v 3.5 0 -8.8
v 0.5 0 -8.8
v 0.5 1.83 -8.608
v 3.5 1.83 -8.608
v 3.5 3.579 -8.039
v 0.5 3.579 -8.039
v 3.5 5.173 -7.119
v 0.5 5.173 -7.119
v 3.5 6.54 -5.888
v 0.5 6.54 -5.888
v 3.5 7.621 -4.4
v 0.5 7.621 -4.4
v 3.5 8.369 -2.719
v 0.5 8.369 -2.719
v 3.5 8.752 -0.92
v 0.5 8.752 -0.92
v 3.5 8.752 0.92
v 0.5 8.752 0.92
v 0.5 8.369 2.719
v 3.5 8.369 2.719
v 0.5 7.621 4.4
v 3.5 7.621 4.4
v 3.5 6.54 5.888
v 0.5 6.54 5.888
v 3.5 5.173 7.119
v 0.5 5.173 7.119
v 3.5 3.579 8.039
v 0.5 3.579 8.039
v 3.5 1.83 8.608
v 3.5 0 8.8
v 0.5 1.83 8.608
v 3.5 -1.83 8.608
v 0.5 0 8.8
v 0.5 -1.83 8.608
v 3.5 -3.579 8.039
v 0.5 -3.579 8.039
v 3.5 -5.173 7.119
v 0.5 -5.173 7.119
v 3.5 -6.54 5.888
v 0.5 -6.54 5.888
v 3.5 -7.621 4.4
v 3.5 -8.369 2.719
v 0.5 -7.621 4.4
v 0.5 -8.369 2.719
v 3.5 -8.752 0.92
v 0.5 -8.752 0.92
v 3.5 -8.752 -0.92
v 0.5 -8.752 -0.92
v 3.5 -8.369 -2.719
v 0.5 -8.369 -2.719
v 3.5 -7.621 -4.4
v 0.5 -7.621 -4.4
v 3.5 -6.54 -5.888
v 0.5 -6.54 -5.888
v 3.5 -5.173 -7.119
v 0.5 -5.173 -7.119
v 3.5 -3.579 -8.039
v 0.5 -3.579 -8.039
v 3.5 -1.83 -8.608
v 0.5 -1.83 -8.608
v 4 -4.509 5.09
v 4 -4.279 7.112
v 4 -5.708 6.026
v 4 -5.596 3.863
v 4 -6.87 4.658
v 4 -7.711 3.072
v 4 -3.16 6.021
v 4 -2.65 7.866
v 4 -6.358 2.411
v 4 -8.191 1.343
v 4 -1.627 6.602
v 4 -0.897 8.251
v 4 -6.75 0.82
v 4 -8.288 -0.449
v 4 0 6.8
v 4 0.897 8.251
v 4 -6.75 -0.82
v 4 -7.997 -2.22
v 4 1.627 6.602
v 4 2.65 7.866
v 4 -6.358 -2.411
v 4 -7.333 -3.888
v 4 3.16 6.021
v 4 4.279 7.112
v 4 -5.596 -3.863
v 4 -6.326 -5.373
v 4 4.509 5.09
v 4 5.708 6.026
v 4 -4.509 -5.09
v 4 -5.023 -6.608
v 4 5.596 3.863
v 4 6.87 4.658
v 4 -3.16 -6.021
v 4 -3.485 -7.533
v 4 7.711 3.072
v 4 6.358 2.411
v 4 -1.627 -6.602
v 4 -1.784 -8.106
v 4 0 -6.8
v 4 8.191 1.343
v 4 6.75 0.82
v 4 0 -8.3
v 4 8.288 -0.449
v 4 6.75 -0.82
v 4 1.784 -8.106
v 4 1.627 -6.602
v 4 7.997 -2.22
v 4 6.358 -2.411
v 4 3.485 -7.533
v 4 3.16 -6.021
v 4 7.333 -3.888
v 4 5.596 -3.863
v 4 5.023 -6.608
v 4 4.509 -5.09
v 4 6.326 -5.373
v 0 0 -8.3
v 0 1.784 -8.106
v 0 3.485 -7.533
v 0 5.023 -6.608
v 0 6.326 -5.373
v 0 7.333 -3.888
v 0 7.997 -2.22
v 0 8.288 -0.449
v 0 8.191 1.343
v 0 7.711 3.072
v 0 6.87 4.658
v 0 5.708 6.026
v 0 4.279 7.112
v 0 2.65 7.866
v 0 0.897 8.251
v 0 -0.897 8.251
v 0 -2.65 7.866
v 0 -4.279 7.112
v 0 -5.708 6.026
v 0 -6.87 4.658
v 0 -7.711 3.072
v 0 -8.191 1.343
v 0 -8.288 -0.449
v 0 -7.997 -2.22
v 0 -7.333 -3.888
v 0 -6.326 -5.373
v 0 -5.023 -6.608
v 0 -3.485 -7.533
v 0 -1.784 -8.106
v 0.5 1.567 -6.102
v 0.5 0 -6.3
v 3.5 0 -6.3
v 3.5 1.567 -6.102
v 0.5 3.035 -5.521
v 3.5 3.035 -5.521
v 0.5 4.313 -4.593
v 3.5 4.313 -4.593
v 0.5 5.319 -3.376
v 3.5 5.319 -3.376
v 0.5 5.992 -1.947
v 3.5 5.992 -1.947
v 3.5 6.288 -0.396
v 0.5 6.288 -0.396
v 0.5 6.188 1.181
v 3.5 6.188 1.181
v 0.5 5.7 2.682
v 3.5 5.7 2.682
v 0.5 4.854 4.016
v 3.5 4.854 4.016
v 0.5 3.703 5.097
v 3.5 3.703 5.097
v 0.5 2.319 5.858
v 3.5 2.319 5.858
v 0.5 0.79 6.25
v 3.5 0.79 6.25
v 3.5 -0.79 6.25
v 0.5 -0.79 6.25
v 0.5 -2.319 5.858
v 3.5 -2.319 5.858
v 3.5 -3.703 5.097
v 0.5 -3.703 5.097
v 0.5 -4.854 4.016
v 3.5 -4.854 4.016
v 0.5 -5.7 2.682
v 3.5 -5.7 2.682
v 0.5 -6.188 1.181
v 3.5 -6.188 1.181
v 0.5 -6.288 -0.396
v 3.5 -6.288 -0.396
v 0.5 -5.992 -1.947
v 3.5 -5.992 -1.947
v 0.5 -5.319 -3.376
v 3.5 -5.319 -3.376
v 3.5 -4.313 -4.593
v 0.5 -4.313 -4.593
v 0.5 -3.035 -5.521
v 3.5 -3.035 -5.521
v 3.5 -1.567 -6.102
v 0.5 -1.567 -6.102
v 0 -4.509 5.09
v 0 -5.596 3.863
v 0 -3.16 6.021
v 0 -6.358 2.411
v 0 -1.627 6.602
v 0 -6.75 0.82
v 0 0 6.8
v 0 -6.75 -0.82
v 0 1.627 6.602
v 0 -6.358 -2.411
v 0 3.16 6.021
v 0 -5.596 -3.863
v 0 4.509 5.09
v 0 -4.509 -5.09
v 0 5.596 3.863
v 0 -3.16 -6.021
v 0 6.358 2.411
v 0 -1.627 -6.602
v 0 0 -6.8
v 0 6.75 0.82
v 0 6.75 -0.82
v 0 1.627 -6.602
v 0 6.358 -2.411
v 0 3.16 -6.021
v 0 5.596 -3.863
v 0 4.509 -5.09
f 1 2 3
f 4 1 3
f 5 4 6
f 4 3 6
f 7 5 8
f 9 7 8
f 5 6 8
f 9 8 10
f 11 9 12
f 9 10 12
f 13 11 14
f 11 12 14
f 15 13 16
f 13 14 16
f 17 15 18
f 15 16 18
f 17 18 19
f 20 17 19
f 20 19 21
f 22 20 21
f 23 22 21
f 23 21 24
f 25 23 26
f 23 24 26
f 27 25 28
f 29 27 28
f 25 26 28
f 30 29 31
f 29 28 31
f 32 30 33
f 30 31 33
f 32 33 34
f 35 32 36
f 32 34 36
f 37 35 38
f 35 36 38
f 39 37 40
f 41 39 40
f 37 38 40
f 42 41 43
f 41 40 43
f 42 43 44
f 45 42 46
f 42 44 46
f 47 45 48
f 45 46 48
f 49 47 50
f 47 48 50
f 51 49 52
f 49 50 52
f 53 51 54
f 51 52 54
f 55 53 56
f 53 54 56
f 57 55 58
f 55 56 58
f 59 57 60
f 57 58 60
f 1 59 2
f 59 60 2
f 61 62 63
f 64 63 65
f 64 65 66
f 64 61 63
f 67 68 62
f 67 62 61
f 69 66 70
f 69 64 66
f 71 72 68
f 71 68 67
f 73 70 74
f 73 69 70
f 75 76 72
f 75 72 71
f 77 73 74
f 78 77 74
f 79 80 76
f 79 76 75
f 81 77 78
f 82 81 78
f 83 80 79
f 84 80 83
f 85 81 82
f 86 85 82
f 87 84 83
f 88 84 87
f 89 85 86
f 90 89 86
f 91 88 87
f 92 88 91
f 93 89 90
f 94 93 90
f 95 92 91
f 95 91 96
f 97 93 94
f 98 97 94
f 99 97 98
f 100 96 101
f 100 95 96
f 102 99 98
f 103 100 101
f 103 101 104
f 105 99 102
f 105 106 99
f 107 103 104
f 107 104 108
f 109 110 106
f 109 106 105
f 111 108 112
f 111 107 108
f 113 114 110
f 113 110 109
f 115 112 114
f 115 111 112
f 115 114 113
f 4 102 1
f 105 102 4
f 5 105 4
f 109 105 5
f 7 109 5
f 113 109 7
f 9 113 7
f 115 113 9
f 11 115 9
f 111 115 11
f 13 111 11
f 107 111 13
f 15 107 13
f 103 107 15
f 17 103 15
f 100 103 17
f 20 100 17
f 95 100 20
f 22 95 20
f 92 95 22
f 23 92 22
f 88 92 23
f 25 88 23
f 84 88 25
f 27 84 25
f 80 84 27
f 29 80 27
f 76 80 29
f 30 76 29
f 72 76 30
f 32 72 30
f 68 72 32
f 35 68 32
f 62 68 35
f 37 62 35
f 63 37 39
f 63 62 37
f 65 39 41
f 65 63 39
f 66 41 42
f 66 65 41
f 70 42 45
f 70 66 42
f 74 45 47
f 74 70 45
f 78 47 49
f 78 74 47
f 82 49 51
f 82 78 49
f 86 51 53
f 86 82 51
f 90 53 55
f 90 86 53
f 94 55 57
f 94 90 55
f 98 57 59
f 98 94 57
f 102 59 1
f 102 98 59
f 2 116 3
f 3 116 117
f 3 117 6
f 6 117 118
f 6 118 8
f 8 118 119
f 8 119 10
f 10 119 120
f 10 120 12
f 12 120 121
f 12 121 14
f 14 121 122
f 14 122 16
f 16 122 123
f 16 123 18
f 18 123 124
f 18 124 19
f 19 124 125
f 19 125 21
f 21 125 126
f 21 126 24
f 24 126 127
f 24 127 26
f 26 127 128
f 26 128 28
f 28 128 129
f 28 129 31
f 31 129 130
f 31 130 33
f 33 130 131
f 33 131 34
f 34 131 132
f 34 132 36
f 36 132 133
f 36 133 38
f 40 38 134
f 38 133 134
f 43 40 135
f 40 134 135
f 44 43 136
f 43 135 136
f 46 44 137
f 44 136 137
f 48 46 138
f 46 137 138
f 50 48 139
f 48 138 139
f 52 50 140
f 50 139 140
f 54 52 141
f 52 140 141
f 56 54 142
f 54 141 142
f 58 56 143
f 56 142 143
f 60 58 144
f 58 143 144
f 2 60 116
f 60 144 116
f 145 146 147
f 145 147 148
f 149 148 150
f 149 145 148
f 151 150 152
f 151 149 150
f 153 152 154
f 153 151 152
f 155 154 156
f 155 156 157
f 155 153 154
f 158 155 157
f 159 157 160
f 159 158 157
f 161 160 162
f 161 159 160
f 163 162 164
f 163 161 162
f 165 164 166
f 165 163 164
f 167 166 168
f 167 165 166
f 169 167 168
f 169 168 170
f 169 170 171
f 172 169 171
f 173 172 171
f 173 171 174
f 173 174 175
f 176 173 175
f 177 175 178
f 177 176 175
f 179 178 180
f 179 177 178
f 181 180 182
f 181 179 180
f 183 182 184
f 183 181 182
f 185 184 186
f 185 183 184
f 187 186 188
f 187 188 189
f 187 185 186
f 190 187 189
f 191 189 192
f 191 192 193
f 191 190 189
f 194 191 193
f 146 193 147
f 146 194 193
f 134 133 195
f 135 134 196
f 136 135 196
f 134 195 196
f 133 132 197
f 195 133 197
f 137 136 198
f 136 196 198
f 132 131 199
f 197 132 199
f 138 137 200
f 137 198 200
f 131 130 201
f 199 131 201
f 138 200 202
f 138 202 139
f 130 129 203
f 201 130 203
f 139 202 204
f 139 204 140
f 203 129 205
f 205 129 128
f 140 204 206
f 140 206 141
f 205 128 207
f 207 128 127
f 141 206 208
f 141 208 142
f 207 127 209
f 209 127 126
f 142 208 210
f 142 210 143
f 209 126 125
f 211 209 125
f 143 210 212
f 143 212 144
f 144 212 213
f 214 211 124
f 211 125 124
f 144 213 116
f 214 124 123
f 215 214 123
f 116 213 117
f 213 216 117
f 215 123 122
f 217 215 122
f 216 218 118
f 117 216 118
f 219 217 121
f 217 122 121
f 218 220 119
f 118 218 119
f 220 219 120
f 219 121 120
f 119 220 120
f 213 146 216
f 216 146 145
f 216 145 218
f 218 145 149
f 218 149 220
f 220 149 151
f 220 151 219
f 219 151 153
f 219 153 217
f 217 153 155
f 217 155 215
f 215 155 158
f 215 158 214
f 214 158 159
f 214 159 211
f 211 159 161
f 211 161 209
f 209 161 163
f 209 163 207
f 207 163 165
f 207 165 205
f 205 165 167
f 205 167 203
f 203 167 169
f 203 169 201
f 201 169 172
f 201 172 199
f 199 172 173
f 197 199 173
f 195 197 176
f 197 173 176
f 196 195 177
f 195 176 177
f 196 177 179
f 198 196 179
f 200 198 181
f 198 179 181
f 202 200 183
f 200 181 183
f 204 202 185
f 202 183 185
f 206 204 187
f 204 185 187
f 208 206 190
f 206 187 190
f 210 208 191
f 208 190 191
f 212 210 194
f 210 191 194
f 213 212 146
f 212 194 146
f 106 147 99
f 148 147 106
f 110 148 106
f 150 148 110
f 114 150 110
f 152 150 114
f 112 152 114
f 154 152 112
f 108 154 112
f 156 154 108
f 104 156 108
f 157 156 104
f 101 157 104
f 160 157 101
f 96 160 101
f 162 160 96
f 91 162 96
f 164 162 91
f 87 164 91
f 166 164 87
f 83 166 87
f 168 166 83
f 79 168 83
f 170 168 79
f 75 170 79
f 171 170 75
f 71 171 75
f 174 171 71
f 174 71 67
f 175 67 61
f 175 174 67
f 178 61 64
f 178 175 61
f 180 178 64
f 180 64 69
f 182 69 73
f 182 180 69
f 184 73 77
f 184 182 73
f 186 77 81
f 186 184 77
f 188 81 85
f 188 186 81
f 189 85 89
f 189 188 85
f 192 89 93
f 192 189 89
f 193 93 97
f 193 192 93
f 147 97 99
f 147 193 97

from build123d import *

# Parameters (mm, degrees)
SKETCH1_R           = 8.8
SKETCH1_R_2         = 6.3
BOSS_EXTRUDE1_DEPTH = 4
CHAMFER1_SIZE       = 0.5
CHAMFER2_SIZE       = 0.5


with BuildPart() as part:
    # Sketch1 → Boss-Extrude1 (new body)
    with BuildSketch(Plane(origin=(0, 0, 0), x_dir=(0, 0, -1), z_dir=(1, 0, 0))):
        Circle(SKETCH1_R)
        Circle(SKETCH1_R_2, mode=Mode.SUBTRACT)
    extrude(amount=BOSS_EXTRUDE1_DEPTH)

    # Chamfer1
    chamfer1_edges = [part.edges().sort_by_distance(p)[0] for p in [
        (0, 0, 8.8),
        (4, 0, 8.8),
    ]]
    chamfer(chamfer1_edges, length=CHAMFER1_SIZE)

    # Chamfer2
    chamfer2_edges = [part.edges().sort_by_distance(p)[0] for p in [
        (0, 0, 6.3),
        (4, 0, 6.3),
    ]]
    chamfer(chamfer2_edges, length=CHAMFER2_SIZE)


solid = part.part
